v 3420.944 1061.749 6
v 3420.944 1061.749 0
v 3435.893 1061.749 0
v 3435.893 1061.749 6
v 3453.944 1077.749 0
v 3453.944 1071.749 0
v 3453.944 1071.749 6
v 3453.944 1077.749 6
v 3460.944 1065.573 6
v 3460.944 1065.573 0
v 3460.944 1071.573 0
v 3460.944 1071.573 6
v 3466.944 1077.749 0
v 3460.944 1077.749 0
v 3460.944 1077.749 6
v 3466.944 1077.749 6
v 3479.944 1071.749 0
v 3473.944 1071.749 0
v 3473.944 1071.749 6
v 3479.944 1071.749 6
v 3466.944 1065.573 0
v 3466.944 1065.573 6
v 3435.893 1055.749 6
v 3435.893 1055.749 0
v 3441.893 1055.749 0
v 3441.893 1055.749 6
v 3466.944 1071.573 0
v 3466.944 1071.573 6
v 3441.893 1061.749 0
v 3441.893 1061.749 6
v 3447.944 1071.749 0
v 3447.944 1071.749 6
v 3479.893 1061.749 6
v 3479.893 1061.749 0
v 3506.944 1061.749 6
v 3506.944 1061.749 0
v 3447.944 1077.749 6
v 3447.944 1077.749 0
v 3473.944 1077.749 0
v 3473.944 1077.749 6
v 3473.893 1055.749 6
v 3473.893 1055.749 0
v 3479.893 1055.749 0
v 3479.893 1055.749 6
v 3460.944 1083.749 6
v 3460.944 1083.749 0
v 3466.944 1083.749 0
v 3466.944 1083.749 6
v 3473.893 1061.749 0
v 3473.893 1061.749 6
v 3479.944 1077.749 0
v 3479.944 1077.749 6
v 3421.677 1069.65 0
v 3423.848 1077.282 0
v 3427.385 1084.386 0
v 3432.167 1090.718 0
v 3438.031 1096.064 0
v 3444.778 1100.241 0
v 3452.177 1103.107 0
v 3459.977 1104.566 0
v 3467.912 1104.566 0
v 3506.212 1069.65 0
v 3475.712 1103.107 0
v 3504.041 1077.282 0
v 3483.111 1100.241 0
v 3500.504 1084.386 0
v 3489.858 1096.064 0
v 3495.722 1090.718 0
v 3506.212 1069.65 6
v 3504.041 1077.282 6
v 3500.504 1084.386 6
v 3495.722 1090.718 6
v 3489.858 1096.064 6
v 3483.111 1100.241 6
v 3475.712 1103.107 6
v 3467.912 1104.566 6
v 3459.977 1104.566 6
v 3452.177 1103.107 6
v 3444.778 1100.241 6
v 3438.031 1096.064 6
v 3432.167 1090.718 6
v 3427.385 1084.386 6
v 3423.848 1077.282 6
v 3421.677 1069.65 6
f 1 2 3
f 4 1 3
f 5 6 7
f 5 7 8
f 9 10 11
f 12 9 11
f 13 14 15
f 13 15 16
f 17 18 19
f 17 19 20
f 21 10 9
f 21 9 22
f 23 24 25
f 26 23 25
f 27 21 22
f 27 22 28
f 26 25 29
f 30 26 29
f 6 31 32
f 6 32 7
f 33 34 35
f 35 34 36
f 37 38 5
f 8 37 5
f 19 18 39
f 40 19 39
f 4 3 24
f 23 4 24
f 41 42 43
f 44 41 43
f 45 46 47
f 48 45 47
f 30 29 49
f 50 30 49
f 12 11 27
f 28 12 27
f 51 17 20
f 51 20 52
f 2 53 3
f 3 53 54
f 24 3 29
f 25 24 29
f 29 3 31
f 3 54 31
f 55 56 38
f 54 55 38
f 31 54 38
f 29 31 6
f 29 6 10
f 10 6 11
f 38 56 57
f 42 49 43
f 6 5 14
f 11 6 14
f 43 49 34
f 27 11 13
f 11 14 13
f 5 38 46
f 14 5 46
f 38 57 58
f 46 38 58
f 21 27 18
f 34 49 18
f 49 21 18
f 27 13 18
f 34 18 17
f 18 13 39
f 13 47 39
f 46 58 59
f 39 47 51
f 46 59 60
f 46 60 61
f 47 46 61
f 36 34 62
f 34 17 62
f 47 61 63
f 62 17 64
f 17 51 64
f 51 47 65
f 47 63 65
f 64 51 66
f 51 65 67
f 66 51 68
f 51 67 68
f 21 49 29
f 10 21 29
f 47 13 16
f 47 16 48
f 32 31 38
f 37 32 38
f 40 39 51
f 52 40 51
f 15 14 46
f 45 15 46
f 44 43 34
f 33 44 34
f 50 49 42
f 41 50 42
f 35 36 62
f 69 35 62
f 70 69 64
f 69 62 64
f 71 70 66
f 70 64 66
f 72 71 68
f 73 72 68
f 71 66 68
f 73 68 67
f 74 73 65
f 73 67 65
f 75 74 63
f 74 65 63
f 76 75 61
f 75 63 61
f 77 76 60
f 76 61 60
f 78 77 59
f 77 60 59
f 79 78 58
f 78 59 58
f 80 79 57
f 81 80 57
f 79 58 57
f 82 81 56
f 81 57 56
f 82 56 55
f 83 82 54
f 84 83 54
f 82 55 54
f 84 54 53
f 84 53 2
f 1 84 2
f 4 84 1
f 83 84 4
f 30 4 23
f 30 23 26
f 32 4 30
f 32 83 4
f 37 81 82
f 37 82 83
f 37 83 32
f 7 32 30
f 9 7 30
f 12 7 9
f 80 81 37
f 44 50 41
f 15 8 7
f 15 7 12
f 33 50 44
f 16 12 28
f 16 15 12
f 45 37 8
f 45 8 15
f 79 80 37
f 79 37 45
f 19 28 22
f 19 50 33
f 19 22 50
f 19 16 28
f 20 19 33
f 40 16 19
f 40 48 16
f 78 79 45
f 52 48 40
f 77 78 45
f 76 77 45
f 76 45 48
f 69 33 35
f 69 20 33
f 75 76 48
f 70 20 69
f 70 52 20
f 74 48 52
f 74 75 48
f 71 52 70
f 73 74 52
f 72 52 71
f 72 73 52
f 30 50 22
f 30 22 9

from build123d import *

# Parameters (mm, degrees)
MODEL_W             = 6
MODEL_H             = 6
BOSS_EXTRUDE1_DEPTH = 6


with BuildPart() as part:
    # Model → Boss-Extrude1 (new body)
    with BuildSketch(Plane.XY):
        with BuildLine():
            Line((3463.892984012, 1061.748947436), (3473.892984012, 1061.748947436))
            Line((3473.892984012, 1061.748947436), (3473.892984012, 1055.748947436))
            Line((3473.892984012, 1055.748947436), (3479.892984012, 1055.748947436))
            Line((3479.892984012, 1055.748947436), (3479.892984012, 1061.748947436))
            Line((3479.892984012, 1061.748947436), (3491.892984012, 1061.748947436))
            Line((3491.892984012, 1061.748947436), (3506.94434904, 1061.748947436))
            ThreePointArc((3506.94434904, 1061.748947436), (3463.94434904, 1104.748947436), (3420.94434904, 1061.748947436))
            Line((3420.94434904, 1061.748947436), (3435.892984012, 1061.748947436))
            Line((3435.892984012, 1061.748947436), (3435.892984012, 1055.748947436))
            Line((3435.892984012, 1055.748947436), (3441.892984012, 1055.748947436))
            Line((3441.892984012, 1055.748947436), (3441.892984012, 1061.748947436))
            Line((3441.892984012, 1061.748947436), (3463.892984012, 1061.748947436))
        make_face()
        with Locations((3476.94434904, 1074.748947436)):
            Rectangle(MODEL_W, MODEL_H, mode=Mode.SUBTRACT)
        with Locations((3450.94434904, 1074.748947436)):
            Rectangle(MODEL_W, MODEL_H, mode=Mode.SUBTRACT)
        with Locations((3463.94434904, 1080.748947436)):
            Rectangle(MODEL_W, MODEL_H, mode=Mode.SUBTRACT)
        with Locations((3463.94434904, 1068.57340627)):
            Rectangle(MODEL_W, MODEL_H, mode=Mode.SUBTRACT)
    extrude(amount=BOSS_EXTRUDE1_DEPTH)


solid = part.part
